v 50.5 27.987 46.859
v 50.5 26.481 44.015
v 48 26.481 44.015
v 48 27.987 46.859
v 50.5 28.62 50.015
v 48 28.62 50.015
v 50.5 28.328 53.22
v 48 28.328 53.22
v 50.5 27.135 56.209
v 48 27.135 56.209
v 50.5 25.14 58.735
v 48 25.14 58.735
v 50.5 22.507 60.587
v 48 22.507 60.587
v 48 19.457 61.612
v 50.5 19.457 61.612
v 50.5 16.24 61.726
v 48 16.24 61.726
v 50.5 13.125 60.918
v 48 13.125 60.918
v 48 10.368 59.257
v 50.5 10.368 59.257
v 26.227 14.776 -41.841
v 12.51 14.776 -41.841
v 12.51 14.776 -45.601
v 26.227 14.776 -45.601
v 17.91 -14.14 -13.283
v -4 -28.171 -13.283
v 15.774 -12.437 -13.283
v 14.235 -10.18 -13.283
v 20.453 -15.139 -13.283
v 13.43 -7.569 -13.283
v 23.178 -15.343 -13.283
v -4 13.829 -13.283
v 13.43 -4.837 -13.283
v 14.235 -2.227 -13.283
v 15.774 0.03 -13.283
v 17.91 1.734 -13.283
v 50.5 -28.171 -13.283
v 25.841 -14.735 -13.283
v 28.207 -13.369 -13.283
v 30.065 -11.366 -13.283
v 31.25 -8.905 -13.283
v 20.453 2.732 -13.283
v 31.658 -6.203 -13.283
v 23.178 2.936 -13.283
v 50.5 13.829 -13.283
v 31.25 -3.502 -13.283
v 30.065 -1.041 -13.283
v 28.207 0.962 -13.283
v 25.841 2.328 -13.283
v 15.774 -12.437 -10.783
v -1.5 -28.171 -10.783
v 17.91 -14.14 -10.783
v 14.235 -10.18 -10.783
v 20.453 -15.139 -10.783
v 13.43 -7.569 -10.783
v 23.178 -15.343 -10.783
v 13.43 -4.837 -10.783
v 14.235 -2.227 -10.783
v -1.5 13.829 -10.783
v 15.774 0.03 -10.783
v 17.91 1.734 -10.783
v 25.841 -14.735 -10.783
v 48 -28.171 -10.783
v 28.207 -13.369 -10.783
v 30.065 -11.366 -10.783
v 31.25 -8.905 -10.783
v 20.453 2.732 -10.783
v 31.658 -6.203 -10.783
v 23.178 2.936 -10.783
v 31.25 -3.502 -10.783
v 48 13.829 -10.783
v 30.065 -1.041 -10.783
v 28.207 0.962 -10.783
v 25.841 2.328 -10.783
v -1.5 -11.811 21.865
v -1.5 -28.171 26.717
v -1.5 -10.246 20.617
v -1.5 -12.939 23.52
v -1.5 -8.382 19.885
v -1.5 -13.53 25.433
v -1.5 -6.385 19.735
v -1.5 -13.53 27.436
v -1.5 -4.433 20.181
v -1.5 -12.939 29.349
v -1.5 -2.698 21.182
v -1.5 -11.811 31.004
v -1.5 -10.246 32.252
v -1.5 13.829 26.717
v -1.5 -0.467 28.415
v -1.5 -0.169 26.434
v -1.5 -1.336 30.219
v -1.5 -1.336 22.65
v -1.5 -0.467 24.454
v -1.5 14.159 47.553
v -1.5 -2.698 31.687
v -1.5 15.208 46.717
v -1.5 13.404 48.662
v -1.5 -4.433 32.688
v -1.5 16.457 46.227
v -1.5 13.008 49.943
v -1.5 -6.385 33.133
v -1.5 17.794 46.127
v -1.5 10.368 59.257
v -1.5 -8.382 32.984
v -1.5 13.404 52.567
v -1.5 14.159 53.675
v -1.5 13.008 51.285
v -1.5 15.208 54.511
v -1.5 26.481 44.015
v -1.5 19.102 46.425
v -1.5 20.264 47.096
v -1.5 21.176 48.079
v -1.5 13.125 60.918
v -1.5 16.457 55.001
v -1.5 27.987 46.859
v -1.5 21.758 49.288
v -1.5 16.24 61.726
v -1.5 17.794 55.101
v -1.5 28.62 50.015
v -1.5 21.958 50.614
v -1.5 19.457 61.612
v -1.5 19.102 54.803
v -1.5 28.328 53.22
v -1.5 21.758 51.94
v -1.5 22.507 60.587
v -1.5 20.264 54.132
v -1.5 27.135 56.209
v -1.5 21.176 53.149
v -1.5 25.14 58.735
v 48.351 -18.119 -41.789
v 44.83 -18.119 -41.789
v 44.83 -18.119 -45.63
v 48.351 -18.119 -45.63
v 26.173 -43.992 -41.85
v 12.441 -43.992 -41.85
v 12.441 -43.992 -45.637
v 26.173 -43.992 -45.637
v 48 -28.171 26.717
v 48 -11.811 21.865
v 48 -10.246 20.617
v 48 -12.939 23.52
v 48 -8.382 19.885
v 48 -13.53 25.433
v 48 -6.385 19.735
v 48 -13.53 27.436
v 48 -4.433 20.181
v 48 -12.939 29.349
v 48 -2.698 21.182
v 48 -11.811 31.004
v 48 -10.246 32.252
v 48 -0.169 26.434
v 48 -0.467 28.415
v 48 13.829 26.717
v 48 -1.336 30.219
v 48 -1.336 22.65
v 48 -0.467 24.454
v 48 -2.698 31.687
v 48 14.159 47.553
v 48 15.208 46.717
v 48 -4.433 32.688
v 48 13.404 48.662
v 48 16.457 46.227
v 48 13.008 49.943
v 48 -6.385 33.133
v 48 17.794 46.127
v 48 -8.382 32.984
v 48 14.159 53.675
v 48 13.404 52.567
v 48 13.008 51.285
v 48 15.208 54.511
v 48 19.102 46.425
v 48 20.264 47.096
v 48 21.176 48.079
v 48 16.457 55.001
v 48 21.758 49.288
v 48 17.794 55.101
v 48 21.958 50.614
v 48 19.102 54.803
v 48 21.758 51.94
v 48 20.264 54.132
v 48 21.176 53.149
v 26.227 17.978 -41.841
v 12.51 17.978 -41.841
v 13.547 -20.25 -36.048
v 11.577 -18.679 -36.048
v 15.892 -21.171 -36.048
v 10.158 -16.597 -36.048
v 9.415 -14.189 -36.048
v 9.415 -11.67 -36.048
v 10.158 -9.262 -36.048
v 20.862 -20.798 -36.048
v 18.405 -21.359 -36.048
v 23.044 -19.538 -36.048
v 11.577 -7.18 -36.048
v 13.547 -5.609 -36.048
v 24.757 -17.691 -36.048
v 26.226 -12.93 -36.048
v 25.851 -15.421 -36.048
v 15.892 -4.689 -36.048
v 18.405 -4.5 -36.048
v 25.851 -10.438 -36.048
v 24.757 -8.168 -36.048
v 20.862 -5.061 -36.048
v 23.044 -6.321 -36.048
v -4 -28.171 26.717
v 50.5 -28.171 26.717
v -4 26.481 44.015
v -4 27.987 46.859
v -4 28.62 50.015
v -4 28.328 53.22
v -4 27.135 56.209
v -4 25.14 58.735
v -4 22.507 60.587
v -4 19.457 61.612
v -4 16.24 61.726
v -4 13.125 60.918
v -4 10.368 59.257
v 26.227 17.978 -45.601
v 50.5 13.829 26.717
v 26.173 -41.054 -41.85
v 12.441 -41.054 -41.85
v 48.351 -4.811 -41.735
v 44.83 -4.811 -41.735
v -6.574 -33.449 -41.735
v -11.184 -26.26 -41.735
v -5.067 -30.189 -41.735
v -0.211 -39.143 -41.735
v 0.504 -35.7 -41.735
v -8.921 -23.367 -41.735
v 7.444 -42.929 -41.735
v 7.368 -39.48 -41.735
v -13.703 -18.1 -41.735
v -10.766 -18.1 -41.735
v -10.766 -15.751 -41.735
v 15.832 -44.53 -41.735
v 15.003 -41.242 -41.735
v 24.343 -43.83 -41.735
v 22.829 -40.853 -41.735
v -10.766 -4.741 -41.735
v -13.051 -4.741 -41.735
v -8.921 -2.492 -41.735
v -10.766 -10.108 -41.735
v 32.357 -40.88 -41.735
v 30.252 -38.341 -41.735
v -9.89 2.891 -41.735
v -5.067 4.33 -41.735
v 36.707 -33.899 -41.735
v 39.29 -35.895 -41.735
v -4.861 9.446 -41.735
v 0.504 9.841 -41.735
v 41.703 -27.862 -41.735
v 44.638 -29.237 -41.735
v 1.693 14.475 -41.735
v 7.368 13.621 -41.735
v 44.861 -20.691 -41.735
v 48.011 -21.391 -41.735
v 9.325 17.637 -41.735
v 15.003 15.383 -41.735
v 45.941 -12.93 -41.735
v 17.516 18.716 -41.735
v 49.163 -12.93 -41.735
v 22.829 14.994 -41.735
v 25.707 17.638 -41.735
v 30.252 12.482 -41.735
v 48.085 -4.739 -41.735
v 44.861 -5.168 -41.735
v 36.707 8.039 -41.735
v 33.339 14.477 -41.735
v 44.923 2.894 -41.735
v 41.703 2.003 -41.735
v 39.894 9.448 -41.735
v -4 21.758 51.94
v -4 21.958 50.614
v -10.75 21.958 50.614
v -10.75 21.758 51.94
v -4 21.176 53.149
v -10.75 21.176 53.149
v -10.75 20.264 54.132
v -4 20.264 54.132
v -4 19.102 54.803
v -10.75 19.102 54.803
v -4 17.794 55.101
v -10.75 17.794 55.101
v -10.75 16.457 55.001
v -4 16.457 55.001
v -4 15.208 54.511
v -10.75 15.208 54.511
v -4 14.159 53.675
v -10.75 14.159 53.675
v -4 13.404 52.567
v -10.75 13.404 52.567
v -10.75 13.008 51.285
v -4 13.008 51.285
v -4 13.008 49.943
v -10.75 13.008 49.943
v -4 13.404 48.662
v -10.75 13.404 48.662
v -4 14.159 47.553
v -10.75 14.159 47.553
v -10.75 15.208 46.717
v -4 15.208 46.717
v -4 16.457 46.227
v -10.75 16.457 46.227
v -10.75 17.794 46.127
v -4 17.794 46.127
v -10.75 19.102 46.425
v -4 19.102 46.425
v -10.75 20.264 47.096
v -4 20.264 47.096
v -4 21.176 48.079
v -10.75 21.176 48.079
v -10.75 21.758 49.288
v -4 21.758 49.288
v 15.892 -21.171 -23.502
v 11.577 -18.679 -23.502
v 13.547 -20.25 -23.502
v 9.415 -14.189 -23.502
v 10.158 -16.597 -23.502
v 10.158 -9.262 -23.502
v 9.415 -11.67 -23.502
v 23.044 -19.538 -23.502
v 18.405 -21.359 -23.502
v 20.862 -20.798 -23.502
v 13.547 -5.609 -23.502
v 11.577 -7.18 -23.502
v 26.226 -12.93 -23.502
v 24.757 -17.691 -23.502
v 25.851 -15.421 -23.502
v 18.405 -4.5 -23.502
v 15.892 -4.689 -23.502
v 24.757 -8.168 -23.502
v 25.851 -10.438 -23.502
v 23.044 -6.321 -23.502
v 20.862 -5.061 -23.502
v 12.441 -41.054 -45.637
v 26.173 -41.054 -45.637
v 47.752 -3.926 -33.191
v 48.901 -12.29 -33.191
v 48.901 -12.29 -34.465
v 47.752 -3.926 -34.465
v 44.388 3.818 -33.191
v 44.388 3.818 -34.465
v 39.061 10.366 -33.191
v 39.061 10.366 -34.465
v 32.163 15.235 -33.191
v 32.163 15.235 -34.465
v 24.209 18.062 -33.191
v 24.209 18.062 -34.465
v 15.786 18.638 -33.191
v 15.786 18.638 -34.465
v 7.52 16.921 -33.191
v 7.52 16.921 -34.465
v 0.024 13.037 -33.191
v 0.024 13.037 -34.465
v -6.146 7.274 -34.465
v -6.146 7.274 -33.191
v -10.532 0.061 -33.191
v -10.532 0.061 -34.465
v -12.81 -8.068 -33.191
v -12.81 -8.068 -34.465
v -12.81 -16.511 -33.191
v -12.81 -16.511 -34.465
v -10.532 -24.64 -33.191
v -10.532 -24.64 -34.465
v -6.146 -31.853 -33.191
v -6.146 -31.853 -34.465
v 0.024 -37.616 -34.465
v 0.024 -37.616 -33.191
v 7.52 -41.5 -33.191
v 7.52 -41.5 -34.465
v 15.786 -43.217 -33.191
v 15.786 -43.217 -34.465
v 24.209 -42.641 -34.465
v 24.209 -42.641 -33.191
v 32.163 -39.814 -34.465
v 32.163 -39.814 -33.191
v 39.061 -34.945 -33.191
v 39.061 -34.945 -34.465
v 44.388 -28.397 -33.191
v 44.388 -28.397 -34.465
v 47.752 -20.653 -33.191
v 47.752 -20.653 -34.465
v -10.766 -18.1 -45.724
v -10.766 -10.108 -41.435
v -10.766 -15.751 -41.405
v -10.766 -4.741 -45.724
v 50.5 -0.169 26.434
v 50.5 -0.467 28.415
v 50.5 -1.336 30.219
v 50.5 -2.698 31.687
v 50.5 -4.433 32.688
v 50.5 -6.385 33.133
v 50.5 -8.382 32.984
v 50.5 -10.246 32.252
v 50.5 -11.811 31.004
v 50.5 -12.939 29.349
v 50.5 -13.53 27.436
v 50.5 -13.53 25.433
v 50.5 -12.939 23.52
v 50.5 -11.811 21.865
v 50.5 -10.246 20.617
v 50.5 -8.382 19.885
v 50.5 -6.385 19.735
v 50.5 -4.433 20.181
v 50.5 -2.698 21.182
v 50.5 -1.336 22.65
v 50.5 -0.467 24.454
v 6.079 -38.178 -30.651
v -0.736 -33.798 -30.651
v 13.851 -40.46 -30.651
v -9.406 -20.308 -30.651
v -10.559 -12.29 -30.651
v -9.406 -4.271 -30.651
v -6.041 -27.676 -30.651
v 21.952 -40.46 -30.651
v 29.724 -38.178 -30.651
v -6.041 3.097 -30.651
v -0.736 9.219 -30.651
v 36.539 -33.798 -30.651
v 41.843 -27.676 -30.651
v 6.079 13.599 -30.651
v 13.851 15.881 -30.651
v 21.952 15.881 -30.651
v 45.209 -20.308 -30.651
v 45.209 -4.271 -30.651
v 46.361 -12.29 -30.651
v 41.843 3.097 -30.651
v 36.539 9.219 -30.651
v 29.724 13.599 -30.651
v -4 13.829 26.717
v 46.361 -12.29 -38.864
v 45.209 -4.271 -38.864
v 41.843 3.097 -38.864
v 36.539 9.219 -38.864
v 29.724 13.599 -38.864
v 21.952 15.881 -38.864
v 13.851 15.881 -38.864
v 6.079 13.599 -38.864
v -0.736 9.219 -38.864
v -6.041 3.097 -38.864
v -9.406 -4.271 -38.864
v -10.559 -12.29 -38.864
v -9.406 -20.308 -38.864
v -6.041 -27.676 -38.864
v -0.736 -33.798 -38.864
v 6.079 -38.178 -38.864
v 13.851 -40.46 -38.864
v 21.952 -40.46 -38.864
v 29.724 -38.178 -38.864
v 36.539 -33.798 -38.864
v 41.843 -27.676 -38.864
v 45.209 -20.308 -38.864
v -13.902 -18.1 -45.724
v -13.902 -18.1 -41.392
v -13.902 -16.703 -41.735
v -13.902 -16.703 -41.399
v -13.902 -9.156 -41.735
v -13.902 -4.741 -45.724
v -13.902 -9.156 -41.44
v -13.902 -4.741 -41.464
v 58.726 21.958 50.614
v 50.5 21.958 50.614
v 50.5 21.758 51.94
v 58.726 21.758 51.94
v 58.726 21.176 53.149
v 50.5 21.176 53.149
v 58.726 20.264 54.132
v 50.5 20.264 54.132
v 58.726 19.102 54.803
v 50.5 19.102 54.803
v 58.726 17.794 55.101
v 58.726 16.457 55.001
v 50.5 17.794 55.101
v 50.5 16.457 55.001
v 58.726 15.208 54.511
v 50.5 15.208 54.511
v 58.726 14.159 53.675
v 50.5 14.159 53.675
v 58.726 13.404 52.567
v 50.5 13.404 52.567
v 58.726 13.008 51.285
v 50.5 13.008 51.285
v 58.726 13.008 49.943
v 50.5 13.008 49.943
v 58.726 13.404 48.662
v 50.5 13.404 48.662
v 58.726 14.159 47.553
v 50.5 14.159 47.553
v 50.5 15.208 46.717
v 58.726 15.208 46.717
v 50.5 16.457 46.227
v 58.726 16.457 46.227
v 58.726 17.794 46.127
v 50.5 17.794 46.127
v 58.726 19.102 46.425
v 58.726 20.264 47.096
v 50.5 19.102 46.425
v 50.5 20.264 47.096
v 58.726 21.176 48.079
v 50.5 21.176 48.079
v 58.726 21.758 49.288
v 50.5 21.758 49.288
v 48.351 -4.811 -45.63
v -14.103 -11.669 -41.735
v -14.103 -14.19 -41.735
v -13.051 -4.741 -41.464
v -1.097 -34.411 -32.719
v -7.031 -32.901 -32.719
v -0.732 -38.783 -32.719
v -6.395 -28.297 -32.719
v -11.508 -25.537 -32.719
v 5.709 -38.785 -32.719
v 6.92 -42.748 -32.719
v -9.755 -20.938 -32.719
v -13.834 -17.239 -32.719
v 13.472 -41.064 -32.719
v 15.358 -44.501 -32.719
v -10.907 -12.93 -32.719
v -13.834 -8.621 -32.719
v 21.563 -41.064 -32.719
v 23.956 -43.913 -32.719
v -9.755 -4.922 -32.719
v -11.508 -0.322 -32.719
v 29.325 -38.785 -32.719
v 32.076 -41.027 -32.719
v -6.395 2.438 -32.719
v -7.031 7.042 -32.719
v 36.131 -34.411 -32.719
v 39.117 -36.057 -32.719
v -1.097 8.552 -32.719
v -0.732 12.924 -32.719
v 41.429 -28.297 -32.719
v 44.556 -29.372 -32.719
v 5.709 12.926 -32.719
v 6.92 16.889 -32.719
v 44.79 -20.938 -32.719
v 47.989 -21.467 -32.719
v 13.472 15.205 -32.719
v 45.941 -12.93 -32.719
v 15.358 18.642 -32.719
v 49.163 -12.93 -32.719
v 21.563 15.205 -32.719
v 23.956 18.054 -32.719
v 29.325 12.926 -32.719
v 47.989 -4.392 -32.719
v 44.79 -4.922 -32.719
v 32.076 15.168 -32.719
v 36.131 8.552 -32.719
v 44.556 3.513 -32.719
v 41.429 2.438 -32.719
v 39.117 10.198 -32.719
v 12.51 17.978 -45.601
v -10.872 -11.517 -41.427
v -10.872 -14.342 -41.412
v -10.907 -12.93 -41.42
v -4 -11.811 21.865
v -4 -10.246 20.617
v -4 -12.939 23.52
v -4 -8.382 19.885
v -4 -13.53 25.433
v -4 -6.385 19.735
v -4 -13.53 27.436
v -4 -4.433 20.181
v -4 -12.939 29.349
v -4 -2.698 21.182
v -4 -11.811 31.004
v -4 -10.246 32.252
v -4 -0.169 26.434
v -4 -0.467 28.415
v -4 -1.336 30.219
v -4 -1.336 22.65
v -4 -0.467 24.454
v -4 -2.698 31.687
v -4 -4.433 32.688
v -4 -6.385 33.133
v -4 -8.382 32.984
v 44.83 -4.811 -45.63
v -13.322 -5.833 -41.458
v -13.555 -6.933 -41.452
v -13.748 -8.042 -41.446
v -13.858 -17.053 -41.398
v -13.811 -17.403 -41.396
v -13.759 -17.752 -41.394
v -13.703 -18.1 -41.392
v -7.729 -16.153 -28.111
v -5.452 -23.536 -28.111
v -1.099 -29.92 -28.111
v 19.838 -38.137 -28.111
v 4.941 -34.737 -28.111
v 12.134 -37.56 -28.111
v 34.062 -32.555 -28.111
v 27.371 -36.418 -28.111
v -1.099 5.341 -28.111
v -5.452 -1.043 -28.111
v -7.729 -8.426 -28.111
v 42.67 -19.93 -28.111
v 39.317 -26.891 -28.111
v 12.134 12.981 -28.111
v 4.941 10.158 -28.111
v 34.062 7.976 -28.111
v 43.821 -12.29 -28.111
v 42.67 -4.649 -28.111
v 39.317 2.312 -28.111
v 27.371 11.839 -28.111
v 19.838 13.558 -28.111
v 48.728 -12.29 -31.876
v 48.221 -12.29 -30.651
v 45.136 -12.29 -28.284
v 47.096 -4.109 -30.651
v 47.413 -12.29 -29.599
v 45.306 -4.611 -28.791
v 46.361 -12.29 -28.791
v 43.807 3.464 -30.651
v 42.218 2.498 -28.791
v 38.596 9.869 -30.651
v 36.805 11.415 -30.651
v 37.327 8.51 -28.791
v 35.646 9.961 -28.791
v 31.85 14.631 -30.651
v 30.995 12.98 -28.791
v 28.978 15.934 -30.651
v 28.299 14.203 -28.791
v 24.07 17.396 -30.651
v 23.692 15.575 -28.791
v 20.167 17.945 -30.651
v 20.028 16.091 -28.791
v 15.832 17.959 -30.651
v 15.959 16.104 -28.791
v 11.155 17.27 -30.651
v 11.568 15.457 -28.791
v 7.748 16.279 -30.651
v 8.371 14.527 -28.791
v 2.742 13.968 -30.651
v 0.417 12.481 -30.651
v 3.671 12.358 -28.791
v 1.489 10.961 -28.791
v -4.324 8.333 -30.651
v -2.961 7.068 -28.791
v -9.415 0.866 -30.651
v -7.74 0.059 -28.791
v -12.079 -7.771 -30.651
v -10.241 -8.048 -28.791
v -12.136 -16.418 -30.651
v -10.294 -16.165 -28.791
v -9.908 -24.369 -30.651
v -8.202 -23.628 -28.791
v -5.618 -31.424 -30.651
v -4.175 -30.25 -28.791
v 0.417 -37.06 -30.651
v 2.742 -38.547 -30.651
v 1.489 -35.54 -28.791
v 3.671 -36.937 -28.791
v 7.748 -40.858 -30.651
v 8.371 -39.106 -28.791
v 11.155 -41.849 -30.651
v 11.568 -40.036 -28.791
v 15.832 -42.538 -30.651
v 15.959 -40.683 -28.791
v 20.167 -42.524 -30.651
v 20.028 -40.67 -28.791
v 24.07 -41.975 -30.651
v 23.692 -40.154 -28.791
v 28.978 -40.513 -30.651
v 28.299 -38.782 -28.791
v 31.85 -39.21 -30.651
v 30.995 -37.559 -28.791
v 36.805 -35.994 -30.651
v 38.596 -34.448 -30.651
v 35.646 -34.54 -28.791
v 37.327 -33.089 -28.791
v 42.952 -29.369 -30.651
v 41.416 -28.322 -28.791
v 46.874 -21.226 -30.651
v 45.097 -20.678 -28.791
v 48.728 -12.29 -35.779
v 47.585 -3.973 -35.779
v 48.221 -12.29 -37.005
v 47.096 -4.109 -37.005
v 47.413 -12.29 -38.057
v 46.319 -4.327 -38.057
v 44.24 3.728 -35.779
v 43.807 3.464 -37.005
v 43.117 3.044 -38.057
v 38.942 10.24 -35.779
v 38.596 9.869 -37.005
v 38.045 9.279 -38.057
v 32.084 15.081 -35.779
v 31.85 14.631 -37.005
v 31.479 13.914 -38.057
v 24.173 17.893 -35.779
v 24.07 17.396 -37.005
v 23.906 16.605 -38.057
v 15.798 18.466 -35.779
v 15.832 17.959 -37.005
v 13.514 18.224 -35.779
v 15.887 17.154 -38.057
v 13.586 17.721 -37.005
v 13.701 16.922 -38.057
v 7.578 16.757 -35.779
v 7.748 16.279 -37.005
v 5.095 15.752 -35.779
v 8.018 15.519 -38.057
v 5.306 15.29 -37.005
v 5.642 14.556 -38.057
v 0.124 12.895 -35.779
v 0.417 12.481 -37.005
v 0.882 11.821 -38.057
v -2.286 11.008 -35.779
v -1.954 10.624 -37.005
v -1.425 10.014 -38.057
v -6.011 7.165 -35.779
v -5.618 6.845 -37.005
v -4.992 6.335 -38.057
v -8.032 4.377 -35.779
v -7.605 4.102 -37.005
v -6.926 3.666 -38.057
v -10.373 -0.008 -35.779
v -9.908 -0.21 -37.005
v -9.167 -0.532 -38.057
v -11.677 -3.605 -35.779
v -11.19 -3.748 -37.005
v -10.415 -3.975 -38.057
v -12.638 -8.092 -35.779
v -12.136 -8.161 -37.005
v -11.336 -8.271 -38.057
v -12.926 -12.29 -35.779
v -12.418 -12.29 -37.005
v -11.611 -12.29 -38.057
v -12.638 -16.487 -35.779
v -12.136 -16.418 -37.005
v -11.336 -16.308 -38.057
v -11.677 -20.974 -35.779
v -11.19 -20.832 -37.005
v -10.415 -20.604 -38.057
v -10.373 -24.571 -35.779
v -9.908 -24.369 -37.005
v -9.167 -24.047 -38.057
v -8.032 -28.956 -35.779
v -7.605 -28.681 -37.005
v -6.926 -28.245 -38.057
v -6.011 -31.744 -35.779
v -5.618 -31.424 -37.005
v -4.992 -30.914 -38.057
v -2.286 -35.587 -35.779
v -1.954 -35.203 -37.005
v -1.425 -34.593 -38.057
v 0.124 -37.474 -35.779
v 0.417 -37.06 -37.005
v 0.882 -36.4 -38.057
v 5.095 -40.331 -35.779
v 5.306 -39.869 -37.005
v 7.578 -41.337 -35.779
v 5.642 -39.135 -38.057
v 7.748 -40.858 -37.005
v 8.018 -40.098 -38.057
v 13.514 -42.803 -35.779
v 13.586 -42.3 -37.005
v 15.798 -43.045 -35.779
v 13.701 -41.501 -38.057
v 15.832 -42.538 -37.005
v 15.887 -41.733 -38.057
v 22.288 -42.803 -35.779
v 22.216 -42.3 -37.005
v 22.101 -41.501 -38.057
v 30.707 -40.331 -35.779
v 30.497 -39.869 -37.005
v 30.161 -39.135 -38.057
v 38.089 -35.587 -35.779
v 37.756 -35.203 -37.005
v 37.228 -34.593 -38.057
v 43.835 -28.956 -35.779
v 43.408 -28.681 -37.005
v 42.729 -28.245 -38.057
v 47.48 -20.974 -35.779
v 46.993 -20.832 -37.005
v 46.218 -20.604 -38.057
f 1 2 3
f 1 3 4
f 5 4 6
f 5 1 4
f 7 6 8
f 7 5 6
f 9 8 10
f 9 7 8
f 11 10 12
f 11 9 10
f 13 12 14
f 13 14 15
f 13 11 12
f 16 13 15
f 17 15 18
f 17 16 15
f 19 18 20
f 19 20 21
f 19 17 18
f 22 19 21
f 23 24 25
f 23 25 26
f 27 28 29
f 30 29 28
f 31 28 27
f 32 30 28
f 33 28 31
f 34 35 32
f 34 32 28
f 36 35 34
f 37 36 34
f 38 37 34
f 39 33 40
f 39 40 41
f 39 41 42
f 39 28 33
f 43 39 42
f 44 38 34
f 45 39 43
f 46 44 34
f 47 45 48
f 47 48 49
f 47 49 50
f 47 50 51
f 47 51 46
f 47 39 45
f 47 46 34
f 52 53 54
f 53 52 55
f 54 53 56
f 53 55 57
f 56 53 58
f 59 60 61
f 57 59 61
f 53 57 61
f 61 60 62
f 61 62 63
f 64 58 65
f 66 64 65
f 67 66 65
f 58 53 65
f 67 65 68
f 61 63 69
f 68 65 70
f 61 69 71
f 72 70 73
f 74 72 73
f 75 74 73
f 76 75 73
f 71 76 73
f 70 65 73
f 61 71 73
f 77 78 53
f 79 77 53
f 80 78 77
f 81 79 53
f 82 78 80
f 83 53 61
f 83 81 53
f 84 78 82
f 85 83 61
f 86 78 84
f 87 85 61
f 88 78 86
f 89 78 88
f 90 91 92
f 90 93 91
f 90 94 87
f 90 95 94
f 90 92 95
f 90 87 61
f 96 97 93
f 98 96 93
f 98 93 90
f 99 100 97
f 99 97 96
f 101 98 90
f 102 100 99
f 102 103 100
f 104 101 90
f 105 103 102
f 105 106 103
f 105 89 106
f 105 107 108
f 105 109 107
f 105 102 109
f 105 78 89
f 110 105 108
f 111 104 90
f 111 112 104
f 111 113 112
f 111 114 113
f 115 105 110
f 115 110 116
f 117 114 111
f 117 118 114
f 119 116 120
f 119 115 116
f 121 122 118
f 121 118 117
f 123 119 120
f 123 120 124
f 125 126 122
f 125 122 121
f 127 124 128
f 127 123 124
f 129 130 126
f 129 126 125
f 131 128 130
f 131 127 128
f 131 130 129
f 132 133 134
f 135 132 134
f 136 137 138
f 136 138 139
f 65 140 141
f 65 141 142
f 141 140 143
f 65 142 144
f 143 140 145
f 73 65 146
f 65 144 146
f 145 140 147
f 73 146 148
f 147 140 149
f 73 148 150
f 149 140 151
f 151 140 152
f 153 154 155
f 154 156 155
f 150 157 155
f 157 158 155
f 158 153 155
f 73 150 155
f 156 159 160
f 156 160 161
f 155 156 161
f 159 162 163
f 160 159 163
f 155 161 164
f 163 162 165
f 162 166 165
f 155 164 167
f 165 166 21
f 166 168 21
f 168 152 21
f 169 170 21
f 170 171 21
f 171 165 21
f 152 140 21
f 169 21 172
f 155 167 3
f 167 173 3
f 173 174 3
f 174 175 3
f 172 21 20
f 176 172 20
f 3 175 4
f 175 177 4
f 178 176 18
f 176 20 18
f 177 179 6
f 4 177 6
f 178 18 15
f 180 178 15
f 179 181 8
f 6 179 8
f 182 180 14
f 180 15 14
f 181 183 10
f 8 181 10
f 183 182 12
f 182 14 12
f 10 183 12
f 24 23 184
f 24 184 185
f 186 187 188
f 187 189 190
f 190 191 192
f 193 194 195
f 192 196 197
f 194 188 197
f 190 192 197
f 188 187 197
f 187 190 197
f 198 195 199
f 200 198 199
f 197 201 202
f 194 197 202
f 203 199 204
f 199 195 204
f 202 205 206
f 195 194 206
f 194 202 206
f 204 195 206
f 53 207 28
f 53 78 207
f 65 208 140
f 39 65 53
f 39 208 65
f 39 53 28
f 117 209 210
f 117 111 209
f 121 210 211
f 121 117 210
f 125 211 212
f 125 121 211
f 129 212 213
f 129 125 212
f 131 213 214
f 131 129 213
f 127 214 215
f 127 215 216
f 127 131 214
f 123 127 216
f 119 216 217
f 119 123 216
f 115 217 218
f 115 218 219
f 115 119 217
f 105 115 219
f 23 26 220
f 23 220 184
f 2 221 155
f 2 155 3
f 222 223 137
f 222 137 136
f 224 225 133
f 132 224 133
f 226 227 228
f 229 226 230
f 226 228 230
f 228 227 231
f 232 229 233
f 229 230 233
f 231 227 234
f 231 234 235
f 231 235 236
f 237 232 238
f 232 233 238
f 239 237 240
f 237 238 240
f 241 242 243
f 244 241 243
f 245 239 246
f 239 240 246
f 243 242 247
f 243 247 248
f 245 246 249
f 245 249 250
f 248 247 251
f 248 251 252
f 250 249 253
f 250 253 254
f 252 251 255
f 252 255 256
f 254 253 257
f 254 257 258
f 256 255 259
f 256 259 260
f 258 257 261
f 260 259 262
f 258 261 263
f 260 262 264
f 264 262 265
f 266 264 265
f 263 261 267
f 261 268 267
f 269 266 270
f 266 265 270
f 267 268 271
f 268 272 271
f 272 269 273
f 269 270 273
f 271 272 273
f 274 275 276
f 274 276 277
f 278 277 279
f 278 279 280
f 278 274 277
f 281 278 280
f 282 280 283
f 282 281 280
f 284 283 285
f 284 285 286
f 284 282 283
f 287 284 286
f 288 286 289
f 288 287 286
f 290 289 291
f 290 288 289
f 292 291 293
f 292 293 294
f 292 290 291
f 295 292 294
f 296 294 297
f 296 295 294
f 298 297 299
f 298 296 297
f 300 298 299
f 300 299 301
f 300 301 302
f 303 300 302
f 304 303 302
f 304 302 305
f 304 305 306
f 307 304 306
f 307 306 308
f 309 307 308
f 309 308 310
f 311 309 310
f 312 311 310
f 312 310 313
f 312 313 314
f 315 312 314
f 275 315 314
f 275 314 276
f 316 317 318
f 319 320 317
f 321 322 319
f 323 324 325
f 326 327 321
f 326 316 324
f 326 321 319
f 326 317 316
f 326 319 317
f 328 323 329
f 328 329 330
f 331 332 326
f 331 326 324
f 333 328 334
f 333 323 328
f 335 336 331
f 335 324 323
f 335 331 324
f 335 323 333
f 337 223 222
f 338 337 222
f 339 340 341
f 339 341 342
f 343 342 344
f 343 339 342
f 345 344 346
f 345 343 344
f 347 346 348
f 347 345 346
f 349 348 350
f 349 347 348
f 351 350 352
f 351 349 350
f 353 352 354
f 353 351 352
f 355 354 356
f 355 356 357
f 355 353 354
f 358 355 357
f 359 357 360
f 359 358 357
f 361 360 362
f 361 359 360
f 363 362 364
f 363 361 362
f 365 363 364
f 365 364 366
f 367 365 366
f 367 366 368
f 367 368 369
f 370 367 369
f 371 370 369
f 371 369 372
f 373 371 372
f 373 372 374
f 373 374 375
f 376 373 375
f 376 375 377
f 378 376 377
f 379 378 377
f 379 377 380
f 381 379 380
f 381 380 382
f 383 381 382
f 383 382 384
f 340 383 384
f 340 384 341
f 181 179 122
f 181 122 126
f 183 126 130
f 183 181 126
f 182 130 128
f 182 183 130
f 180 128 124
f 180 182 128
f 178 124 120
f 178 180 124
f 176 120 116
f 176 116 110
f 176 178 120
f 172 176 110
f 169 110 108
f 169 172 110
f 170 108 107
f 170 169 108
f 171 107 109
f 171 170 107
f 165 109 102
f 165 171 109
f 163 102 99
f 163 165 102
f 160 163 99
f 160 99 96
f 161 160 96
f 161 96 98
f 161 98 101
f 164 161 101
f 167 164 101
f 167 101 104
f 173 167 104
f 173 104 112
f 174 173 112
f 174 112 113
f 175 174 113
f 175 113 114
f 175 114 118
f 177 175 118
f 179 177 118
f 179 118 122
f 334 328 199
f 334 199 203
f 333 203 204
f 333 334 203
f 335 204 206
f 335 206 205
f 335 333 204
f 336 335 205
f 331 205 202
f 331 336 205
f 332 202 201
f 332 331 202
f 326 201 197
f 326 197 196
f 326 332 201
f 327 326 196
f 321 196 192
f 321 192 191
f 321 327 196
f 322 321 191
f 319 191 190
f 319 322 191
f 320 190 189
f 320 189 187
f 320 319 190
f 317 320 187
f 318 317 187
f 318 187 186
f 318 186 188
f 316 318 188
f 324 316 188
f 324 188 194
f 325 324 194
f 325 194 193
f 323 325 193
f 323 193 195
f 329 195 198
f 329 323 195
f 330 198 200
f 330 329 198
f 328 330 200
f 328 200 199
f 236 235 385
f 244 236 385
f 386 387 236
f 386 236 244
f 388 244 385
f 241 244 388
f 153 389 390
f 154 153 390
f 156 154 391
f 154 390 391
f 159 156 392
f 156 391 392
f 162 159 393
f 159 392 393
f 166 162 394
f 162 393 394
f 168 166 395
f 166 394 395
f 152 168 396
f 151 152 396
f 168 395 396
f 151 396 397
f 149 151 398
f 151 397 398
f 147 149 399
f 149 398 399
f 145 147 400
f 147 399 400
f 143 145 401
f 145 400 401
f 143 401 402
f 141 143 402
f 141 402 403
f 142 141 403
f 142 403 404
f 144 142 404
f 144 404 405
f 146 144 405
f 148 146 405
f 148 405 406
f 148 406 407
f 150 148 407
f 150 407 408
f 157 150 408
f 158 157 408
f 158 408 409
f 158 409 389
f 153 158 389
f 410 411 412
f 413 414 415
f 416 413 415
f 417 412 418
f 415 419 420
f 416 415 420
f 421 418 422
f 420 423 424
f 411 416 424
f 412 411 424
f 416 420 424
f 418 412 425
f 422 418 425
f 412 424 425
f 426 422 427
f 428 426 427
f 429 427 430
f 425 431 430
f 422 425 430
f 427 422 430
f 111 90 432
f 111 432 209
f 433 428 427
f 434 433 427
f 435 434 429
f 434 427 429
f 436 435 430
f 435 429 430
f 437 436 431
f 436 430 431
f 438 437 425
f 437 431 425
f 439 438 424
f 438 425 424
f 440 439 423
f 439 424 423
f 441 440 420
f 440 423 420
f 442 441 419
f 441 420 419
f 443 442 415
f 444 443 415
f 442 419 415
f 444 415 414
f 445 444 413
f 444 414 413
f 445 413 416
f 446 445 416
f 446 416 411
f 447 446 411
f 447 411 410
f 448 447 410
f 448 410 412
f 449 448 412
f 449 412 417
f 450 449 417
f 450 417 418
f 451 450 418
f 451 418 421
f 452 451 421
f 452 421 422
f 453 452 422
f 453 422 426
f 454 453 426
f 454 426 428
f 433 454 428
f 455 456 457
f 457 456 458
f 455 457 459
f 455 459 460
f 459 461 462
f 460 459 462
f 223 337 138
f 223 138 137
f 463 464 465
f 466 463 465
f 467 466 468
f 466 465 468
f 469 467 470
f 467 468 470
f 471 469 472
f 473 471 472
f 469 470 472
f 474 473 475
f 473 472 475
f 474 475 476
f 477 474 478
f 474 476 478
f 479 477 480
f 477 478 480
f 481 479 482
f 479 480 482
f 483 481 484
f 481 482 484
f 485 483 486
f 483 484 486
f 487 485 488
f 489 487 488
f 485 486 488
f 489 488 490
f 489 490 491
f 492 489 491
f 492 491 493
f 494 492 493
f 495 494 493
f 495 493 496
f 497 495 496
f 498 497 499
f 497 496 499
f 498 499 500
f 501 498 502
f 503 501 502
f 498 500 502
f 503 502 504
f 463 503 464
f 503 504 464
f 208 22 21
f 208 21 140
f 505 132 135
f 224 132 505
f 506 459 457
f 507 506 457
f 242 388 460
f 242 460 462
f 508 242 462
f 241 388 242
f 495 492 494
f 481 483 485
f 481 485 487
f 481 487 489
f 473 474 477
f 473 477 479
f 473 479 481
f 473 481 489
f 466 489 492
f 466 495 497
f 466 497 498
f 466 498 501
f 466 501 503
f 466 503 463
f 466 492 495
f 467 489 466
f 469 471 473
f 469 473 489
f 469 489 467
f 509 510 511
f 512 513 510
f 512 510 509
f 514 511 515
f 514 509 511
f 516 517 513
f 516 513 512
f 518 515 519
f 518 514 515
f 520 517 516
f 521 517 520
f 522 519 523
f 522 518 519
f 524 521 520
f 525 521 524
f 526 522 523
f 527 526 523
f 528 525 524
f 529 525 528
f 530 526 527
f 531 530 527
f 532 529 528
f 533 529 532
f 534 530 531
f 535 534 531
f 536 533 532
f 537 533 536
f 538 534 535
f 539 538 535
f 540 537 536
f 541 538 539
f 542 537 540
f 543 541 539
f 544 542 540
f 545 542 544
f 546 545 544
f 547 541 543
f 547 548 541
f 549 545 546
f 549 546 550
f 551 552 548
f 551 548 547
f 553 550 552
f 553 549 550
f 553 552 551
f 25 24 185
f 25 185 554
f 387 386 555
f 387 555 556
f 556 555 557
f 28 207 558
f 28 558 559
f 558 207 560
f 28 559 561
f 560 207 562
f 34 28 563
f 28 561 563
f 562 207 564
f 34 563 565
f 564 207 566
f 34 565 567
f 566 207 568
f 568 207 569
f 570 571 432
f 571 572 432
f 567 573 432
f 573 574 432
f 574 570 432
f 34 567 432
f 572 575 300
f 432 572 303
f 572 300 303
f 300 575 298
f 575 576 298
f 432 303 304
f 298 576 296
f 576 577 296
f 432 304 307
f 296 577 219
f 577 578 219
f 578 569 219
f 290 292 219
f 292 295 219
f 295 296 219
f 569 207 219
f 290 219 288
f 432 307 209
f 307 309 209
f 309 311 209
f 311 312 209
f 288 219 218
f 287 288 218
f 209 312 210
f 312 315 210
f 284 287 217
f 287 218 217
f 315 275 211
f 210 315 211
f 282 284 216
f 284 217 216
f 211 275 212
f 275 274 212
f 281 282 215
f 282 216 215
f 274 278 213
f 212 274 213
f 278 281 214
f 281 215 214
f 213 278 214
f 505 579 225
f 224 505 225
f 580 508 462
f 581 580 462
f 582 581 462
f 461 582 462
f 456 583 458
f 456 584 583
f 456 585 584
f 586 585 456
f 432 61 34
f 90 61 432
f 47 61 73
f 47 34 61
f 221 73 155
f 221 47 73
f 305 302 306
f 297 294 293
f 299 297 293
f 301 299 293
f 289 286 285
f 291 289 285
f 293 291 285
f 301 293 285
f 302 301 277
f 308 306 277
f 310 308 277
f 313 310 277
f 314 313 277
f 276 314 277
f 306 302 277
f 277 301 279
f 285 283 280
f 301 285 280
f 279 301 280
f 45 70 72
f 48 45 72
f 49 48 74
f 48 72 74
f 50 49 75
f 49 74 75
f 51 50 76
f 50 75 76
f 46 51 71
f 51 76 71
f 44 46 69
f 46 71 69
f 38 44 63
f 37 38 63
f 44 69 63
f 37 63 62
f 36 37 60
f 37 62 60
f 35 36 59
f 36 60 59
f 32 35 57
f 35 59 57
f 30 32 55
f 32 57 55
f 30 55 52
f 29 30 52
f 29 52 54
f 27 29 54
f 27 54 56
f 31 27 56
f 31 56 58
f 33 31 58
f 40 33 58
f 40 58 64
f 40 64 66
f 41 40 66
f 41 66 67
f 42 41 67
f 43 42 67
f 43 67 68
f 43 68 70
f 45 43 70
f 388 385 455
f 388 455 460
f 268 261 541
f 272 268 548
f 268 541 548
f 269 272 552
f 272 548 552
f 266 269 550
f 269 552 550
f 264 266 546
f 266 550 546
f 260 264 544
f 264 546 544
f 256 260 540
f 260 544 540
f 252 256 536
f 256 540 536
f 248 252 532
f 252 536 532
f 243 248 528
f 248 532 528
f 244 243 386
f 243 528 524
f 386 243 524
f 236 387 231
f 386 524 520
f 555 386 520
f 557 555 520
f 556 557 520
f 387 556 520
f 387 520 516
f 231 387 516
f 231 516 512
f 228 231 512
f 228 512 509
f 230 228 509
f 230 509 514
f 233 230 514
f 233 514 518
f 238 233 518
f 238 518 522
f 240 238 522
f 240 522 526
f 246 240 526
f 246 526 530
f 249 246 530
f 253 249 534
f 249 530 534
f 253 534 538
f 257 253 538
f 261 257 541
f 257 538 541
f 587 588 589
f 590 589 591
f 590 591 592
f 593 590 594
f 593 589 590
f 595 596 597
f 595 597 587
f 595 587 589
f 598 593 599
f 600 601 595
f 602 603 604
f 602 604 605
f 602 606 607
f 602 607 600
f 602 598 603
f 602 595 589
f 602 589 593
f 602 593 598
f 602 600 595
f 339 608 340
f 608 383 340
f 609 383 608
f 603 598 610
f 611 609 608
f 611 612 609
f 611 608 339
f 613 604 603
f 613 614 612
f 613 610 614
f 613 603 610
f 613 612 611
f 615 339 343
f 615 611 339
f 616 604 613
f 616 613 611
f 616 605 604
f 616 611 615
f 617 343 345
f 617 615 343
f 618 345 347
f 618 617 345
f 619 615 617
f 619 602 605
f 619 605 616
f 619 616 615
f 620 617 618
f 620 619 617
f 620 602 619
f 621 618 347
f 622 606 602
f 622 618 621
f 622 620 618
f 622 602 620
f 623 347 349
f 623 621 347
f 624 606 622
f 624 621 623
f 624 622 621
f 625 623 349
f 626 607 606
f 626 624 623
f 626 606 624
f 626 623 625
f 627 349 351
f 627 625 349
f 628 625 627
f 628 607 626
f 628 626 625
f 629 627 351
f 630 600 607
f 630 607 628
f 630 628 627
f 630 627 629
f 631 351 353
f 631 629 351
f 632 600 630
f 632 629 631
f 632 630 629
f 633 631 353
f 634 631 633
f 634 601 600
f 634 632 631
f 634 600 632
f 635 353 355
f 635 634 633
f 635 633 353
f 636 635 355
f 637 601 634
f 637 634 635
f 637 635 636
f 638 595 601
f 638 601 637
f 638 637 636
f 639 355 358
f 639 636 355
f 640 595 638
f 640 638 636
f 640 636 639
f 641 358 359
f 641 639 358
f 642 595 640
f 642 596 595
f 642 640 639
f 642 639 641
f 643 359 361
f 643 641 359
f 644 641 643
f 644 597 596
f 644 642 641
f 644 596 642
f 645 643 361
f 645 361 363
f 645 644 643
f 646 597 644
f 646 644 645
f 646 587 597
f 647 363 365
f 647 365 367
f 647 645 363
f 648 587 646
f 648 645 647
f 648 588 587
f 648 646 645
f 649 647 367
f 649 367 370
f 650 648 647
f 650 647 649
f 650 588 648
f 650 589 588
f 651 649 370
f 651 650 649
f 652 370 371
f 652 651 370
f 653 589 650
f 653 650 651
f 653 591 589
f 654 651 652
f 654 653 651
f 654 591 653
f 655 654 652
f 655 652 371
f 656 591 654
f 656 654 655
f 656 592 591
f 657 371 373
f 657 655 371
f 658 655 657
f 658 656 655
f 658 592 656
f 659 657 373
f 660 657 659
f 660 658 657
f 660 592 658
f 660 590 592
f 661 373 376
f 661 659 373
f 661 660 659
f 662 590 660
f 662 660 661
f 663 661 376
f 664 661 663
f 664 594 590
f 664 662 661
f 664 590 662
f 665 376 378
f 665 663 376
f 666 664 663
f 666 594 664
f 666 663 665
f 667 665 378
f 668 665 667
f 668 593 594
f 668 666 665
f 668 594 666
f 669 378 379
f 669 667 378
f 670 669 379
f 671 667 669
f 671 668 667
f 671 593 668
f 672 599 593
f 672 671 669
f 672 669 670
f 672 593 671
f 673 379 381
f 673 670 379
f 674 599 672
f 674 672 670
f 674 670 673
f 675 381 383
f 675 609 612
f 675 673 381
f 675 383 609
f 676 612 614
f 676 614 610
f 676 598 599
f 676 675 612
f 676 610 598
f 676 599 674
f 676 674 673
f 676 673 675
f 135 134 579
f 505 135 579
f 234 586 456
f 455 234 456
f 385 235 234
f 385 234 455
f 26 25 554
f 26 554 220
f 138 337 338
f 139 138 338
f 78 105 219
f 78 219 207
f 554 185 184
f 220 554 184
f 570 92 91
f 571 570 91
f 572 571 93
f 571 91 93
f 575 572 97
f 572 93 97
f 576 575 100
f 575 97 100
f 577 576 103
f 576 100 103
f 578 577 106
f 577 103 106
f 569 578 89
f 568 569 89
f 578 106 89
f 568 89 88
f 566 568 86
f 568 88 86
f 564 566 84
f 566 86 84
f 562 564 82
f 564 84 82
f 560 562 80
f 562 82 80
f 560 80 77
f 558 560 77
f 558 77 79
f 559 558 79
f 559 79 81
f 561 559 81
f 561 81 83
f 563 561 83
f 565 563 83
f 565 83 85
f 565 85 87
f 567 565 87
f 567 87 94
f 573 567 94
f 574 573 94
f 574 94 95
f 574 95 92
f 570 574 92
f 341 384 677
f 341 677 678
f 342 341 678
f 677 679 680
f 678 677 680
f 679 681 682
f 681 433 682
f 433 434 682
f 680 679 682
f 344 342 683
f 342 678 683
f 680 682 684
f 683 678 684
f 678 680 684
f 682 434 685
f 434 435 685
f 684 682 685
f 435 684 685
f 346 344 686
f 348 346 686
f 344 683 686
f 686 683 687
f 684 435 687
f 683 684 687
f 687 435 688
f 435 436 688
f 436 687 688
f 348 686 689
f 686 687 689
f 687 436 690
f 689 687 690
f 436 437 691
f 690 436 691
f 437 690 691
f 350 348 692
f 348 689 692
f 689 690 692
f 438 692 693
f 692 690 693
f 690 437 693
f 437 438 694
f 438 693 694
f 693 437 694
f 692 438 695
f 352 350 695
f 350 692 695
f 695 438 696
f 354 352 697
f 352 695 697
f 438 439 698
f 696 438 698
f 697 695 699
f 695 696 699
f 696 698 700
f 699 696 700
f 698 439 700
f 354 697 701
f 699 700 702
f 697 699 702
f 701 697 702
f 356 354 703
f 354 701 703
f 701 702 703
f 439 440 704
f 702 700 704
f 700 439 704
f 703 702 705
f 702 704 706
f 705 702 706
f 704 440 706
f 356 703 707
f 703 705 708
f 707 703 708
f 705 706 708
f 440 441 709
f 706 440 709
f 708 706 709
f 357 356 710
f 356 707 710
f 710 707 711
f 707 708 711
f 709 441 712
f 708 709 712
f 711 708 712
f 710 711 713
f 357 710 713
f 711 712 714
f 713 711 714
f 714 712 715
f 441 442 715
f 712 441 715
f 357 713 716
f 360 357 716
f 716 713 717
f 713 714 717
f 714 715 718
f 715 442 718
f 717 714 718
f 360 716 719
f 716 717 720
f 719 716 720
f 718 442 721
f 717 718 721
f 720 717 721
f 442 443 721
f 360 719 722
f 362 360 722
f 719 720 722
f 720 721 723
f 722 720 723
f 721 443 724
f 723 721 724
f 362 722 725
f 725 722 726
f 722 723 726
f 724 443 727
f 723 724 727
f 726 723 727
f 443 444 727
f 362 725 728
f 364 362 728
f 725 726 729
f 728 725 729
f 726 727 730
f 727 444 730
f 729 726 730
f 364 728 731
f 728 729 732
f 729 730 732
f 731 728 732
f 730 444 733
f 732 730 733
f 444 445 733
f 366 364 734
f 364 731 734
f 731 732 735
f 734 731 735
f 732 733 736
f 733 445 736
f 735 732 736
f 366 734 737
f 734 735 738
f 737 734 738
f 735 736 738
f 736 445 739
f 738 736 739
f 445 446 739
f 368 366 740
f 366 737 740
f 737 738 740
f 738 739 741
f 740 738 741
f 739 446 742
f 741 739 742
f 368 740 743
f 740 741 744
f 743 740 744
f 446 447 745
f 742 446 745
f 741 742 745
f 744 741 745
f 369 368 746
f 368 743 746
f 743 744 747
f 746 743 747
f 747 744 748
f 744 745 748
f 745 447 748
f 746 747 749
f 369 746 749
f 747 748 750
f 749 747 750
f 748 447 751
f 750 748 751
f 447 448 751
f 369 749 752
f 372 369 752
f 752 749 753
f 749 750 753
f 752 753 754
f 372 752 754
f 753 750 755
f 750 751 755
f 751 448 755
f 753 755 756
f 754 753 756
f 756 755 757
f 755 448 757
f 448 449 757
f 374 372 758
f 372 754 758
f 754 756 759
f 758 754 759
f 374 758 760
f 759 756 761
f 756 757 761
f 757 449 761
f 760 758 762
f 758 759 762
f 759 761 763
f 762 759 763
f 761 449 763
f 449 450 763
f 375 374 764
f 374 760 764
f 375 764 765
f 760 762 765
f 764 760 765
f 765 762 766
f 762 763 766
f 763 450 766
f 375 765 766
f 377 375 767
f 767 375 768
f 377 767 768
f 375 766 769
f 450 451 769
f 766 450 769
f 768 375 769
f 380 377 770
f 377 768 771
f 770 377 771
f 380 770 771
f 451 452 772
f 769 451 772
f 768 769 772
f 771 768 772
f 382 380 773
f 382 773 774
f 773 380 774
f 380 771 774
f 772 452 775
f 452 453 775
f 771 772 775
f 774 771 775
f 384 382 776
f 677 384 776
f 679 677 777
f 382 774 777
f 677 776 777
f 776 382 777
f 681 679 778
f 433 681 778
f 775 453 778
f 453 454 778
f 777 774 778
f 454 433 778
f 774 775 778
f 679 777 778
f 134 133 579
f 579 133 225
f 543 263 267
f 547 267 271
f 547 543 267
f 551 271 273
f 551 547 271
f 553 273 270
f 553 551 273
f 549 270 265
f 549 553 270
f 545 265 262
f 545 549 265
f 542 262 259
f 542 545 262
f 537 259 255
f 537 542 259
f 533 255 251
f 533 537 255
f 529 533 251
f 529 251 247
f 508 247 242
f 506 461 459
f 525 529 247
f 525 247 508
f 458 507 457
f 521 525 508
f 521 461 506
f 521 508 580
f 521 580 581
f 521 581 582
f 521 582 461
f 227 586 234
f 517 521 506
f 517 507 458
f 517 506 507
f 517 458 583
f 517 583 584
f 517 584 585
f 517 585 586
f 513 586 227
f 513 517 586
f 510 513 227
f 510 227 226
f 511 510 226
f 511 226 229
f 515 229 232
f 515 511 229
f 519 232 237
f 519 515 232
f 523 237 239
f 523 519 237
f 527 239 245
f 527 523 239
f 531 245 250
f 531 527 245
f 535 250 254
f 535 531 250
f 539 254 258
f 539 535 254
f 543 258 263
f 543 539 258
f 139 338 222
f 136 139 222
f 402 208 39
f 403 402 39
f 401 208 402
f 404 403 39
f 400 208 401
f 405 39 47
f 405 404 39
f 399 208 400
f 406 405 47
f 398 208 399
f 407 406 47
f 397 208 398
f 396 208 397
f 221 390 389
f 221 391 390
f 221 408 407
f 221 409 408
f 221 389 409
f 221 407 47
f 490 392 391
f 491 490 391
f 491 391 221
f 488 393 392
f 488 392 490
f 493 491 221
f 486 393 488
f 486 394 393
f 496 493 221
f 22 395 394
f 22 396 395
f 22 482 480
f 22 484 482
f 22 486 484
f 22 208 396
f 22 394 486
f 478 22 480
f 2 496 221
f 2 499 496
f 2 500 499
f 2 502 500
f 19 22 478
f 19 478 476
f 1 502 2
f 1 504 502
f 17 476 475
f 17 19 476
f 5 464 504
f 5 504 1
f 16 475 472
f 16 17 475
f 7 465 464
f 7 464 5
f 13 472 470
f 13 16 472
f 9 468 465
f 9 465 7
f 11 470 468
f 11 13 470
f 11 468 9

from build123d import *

# Parameters (mm, degrees)
F1_DEPTH       = 50.5
F1_DEPTH_BACK  = 4
F3_START       = -28.11069
F2_R           = 31
F3_DEPTH       = 10.75335
F4_T           = -2.54
F6_START       = -23.50211
F5_R           = 8.452934194
F6_DEPTH       = 12.54557
F8_START       = -32.71926
F7_R           = 31.6455996423
F7_R_2         = 28.4241664141
F8_DEPTH       = 9.01571
F10_START      = -14.77584
F10_DEPTH      = 3.20249
F12_START      = 41.05404
F11_W          = 13.7322936207
F11_H          = 3.7868991494
F12_DEPTH      = 2.93765
F14_START      = -10.76646
F14_DEPTH      = 3.13601
F16_START      = 44.82978
F16_DEPTH      = 3.52112
F18_T          = -2.5
F19_R          = 6.7177835251
F20_DEPTH      = 64.6292769679
F19_R_2        = 4.5
F21_DEPTH      = 61.25
F21_DEPTH_BACK = 8.2255
F22_R          = 9.1649239527
F23_DEPTH      = 25


# Not quite as in the source:
# - a fillet or chamfer that OpenCascade refuses, or shapes differently, is made with other operations: its cross-section is extruded or revolved along the edge and cut away or added
# - a feature names something its author has since deleted; it is built from what else it names


with BuildPart() as f1:
    # F0 (on Right) → F1 (new body, two sides)
    with BuildSketch(Plane.YZ) as f1_sk:
        with BuildLine():
            Line((10.3682326153, 59.2565201223), (-28.1709354445, 26.7167001963))
            Line((-28.1709354445, 26.7167001963), (-28.1709354445, -13.2832998037))
            Line((-28.1709354445, -13.2832998037), (13.8290645555, -13.2832998037))
            Line((13.8290645555, -13.2832998037), (13.8290645555, 26.7167001963))
            Line((13.8290645555, 26.7167001963), (26.480615139, 44.0150722861))
            ThreePointArc((26.480615139, 44.0150722861), (25.1396676432, 58.7347658993), (10.3682326153, 59.2565201223))
        make_face()
    extrude(amount=F1_DEPTH)
    extrude(f1_sk.sketch, amount=-F1_DEPTH_BACK)

    # F18
    f18_openings = [f1.faces().sort_by_distance(p)[0] for p in [
        (23.25, -28.170935, 6.7167),
        (23.25, -8.901351, 42.98661),
        (23.25, 25.139668, 58.734766),
        (23.25, 20.15484, 35.365886),
        (23.25, 13.829065, 6.7167),
    ]]
    offset(amount=F18_T, openings=f18_openings)

    # F19 (on face) → F20 (cut, through all)
    with BuildSketch(Plane.YZ.offset(50.5)):
        with Locations((-6.886796712, 26.4344837213)):
            Circle(F19_R)
    extrude(amount=-F20_DEPTH, mode=Mode.SUBTRACT)

    # F19 (on face) → F21 (join, two sides)
    with BuildSketch(Plane.YZ.offset(50.5)) as f21_sk:
        with Locations((17.4578964769, 50.6140389959)):
            Circle(F19_R_2)
    extrude(amount=-F21_DEPTH)
    extrude(f21_sk.sketch, amount=F21_DEPTH_BACK)

    # F22 (on face) → F23 (cut)
    with BuildSketch(Plane.XY.offset(-10.7832998037)):
        with Locations((22.4927030504, -6.2033818103)):
            Circle(F22_R)
    extrude(amount=-F23_DEPTH, mode=Mode.SUBTRACT)


with BuildPart() as f3:
    # F2 (on Top) → F3 (new body)
    with BuildSketch(Plane.XY.offset(F3_START)):
        with Locations((17.9013703018, -12.2895361856)):
            Circle(F2_R)
    extrude(amount=-F3_DEPTH)

    # F4
    f4_openings = [f3.faces().sort_by_distance(p)[0] for p in [
        (17.90137, -12.289536, -38.86404),
    ]]
    offset(amount=F4_T, openings=f4_openings)

    # F17: fillet of radius 5.08 on 2 edges, made by hand

    # F17_s1 → F17_t2 (revolve, cut)
    with BuildSketch(Plane.XZ.offset(12.2895361856)):
        with BuildLine():
            ThreePointArc((48.9013703018, -33.19069), (47.4134727503, -29.5985875516), (43.8213703018, -28.11069))
            Line((43.8213703018, -28.11069), (43.8213703018, -28.00909))
            Line((43.8213703018, -28.00909), (49.0029703018, -28.00909))
            Line((49.0029703018, -28.00909), (49.0029703018, -33.19069))
            Line((49.0029703018, -33.19069), (48.9013703018, -33.19069))
        make_face()
    revolve(axis=Axis((17.9013703018, -12.2895361856, -28.11069), (0, 0, 1)), mode=Mode.SUBTRACT)

    # F17_s3 → F17_t4 (revolve, cut)
    with BuildSketch(Plane.XZ.offset(12.2895361856)):
        with BuildLine():
            ThreePointArc((48.9013703018, -34.4646309488), (48.2207793531, -37.0046309488), (46.3613703018, -38.86404))
            Line((46.3613703018, -38.86404), (46.4121703018, -38.952028181))
            ThreePointArc((46.4121703018, -38.952028181), (47.6313703018, -38.96564), (48.9013703018, -38.96564))
            Line((48.9013703018, -38.96564), (49.0029703018, -38.86404))
            Line((49.0029703018, -38.86404), (49.0029703018, -34.4646309488))
            Line((49.0029703018, -34.4646309488), (48.9013703018, -34.4646309488))
        make_face()
    revolve(axis=Axis((17.9013703018, -12.2895361856, -38.86404), (0, 0, 1)), mode=Mode.SUBTRACT)


with BuildPart() as f6:
    # F5 (on Top) → F6 (new body)
    with BuildSketch(Plane.XY.offset(F6_START)):
        with Locations((17.773354426, -12.9296155646)):
            Circle(F5_R)
    extrude(amount=-F6_DEPTH)


with BuildPart() as f8:
    # F7 (on Top) → F8 (new body)
    with BuildSketch(Plane.XY.offset(F8_START)):
        with Locations((17.5173226744, -12.9296155646)):
            Circle(F7_R)
        with Locations((17.5173226744, -12.9296155646)):
            Circle(F7_R_2, mode=Mode.SUBTRACT)
    extrude(amount=-F8_DEPTH)

    # F13 (on Right) → F14 (join)
    with BuildSketch(Plane.YZ.offset(F14_START)):
        Polygon((-4.7413306311, -41.4641164243), (-18.1000400335, -41.3919053972), (-18.1000400335, -45.7244589925), (-4.7413306311, -45.7244589925), align=None)
    extrude(amount=-F14_DEPTH)


with BuildPart() as f10:
    # F9 (on Front) → F10 (new body)
    with BuildSketch(Plane.XZ.offset(F10_START)):
        Polygon((26.2270197272, -41.841134429), (12.5101599842, -41.841134429), (12.5101599842, -45.600567013), (24.1948924959, -45.600567013), (26.2270197272, -45.600567013), align=None)
    extrude(amount=-F10_DEPTH)


with BuildPart() as f12:
    # F11 (on Front) → F12 (new body)
    with BuildSketch(Plane.XZ.offset(F12_START)):
        with Locations((19.3067053333, -43.7439270318)):
            Rectangle(F11_W, F11_H)
    extrude(amount=F12_DEPTH)


with BuildPart() as f16:
    # F15 (on Right) → F16 (new body)
    with BuildSketch(Plane.YZ.offset(F16_START)):
        Polygon((-18.1187018752, -45.6302501261), (-4.8111323267, -45.6302501261), (-4.8111323267, -41.7353510857), (-18.1187018752, -41.7894460261), align=None)
    extrude(amount=F16_DEPTH)


solid = Compound([f1.part, f3.part, f6.part, f8.part, f10.part, f12.part, f16.part])
